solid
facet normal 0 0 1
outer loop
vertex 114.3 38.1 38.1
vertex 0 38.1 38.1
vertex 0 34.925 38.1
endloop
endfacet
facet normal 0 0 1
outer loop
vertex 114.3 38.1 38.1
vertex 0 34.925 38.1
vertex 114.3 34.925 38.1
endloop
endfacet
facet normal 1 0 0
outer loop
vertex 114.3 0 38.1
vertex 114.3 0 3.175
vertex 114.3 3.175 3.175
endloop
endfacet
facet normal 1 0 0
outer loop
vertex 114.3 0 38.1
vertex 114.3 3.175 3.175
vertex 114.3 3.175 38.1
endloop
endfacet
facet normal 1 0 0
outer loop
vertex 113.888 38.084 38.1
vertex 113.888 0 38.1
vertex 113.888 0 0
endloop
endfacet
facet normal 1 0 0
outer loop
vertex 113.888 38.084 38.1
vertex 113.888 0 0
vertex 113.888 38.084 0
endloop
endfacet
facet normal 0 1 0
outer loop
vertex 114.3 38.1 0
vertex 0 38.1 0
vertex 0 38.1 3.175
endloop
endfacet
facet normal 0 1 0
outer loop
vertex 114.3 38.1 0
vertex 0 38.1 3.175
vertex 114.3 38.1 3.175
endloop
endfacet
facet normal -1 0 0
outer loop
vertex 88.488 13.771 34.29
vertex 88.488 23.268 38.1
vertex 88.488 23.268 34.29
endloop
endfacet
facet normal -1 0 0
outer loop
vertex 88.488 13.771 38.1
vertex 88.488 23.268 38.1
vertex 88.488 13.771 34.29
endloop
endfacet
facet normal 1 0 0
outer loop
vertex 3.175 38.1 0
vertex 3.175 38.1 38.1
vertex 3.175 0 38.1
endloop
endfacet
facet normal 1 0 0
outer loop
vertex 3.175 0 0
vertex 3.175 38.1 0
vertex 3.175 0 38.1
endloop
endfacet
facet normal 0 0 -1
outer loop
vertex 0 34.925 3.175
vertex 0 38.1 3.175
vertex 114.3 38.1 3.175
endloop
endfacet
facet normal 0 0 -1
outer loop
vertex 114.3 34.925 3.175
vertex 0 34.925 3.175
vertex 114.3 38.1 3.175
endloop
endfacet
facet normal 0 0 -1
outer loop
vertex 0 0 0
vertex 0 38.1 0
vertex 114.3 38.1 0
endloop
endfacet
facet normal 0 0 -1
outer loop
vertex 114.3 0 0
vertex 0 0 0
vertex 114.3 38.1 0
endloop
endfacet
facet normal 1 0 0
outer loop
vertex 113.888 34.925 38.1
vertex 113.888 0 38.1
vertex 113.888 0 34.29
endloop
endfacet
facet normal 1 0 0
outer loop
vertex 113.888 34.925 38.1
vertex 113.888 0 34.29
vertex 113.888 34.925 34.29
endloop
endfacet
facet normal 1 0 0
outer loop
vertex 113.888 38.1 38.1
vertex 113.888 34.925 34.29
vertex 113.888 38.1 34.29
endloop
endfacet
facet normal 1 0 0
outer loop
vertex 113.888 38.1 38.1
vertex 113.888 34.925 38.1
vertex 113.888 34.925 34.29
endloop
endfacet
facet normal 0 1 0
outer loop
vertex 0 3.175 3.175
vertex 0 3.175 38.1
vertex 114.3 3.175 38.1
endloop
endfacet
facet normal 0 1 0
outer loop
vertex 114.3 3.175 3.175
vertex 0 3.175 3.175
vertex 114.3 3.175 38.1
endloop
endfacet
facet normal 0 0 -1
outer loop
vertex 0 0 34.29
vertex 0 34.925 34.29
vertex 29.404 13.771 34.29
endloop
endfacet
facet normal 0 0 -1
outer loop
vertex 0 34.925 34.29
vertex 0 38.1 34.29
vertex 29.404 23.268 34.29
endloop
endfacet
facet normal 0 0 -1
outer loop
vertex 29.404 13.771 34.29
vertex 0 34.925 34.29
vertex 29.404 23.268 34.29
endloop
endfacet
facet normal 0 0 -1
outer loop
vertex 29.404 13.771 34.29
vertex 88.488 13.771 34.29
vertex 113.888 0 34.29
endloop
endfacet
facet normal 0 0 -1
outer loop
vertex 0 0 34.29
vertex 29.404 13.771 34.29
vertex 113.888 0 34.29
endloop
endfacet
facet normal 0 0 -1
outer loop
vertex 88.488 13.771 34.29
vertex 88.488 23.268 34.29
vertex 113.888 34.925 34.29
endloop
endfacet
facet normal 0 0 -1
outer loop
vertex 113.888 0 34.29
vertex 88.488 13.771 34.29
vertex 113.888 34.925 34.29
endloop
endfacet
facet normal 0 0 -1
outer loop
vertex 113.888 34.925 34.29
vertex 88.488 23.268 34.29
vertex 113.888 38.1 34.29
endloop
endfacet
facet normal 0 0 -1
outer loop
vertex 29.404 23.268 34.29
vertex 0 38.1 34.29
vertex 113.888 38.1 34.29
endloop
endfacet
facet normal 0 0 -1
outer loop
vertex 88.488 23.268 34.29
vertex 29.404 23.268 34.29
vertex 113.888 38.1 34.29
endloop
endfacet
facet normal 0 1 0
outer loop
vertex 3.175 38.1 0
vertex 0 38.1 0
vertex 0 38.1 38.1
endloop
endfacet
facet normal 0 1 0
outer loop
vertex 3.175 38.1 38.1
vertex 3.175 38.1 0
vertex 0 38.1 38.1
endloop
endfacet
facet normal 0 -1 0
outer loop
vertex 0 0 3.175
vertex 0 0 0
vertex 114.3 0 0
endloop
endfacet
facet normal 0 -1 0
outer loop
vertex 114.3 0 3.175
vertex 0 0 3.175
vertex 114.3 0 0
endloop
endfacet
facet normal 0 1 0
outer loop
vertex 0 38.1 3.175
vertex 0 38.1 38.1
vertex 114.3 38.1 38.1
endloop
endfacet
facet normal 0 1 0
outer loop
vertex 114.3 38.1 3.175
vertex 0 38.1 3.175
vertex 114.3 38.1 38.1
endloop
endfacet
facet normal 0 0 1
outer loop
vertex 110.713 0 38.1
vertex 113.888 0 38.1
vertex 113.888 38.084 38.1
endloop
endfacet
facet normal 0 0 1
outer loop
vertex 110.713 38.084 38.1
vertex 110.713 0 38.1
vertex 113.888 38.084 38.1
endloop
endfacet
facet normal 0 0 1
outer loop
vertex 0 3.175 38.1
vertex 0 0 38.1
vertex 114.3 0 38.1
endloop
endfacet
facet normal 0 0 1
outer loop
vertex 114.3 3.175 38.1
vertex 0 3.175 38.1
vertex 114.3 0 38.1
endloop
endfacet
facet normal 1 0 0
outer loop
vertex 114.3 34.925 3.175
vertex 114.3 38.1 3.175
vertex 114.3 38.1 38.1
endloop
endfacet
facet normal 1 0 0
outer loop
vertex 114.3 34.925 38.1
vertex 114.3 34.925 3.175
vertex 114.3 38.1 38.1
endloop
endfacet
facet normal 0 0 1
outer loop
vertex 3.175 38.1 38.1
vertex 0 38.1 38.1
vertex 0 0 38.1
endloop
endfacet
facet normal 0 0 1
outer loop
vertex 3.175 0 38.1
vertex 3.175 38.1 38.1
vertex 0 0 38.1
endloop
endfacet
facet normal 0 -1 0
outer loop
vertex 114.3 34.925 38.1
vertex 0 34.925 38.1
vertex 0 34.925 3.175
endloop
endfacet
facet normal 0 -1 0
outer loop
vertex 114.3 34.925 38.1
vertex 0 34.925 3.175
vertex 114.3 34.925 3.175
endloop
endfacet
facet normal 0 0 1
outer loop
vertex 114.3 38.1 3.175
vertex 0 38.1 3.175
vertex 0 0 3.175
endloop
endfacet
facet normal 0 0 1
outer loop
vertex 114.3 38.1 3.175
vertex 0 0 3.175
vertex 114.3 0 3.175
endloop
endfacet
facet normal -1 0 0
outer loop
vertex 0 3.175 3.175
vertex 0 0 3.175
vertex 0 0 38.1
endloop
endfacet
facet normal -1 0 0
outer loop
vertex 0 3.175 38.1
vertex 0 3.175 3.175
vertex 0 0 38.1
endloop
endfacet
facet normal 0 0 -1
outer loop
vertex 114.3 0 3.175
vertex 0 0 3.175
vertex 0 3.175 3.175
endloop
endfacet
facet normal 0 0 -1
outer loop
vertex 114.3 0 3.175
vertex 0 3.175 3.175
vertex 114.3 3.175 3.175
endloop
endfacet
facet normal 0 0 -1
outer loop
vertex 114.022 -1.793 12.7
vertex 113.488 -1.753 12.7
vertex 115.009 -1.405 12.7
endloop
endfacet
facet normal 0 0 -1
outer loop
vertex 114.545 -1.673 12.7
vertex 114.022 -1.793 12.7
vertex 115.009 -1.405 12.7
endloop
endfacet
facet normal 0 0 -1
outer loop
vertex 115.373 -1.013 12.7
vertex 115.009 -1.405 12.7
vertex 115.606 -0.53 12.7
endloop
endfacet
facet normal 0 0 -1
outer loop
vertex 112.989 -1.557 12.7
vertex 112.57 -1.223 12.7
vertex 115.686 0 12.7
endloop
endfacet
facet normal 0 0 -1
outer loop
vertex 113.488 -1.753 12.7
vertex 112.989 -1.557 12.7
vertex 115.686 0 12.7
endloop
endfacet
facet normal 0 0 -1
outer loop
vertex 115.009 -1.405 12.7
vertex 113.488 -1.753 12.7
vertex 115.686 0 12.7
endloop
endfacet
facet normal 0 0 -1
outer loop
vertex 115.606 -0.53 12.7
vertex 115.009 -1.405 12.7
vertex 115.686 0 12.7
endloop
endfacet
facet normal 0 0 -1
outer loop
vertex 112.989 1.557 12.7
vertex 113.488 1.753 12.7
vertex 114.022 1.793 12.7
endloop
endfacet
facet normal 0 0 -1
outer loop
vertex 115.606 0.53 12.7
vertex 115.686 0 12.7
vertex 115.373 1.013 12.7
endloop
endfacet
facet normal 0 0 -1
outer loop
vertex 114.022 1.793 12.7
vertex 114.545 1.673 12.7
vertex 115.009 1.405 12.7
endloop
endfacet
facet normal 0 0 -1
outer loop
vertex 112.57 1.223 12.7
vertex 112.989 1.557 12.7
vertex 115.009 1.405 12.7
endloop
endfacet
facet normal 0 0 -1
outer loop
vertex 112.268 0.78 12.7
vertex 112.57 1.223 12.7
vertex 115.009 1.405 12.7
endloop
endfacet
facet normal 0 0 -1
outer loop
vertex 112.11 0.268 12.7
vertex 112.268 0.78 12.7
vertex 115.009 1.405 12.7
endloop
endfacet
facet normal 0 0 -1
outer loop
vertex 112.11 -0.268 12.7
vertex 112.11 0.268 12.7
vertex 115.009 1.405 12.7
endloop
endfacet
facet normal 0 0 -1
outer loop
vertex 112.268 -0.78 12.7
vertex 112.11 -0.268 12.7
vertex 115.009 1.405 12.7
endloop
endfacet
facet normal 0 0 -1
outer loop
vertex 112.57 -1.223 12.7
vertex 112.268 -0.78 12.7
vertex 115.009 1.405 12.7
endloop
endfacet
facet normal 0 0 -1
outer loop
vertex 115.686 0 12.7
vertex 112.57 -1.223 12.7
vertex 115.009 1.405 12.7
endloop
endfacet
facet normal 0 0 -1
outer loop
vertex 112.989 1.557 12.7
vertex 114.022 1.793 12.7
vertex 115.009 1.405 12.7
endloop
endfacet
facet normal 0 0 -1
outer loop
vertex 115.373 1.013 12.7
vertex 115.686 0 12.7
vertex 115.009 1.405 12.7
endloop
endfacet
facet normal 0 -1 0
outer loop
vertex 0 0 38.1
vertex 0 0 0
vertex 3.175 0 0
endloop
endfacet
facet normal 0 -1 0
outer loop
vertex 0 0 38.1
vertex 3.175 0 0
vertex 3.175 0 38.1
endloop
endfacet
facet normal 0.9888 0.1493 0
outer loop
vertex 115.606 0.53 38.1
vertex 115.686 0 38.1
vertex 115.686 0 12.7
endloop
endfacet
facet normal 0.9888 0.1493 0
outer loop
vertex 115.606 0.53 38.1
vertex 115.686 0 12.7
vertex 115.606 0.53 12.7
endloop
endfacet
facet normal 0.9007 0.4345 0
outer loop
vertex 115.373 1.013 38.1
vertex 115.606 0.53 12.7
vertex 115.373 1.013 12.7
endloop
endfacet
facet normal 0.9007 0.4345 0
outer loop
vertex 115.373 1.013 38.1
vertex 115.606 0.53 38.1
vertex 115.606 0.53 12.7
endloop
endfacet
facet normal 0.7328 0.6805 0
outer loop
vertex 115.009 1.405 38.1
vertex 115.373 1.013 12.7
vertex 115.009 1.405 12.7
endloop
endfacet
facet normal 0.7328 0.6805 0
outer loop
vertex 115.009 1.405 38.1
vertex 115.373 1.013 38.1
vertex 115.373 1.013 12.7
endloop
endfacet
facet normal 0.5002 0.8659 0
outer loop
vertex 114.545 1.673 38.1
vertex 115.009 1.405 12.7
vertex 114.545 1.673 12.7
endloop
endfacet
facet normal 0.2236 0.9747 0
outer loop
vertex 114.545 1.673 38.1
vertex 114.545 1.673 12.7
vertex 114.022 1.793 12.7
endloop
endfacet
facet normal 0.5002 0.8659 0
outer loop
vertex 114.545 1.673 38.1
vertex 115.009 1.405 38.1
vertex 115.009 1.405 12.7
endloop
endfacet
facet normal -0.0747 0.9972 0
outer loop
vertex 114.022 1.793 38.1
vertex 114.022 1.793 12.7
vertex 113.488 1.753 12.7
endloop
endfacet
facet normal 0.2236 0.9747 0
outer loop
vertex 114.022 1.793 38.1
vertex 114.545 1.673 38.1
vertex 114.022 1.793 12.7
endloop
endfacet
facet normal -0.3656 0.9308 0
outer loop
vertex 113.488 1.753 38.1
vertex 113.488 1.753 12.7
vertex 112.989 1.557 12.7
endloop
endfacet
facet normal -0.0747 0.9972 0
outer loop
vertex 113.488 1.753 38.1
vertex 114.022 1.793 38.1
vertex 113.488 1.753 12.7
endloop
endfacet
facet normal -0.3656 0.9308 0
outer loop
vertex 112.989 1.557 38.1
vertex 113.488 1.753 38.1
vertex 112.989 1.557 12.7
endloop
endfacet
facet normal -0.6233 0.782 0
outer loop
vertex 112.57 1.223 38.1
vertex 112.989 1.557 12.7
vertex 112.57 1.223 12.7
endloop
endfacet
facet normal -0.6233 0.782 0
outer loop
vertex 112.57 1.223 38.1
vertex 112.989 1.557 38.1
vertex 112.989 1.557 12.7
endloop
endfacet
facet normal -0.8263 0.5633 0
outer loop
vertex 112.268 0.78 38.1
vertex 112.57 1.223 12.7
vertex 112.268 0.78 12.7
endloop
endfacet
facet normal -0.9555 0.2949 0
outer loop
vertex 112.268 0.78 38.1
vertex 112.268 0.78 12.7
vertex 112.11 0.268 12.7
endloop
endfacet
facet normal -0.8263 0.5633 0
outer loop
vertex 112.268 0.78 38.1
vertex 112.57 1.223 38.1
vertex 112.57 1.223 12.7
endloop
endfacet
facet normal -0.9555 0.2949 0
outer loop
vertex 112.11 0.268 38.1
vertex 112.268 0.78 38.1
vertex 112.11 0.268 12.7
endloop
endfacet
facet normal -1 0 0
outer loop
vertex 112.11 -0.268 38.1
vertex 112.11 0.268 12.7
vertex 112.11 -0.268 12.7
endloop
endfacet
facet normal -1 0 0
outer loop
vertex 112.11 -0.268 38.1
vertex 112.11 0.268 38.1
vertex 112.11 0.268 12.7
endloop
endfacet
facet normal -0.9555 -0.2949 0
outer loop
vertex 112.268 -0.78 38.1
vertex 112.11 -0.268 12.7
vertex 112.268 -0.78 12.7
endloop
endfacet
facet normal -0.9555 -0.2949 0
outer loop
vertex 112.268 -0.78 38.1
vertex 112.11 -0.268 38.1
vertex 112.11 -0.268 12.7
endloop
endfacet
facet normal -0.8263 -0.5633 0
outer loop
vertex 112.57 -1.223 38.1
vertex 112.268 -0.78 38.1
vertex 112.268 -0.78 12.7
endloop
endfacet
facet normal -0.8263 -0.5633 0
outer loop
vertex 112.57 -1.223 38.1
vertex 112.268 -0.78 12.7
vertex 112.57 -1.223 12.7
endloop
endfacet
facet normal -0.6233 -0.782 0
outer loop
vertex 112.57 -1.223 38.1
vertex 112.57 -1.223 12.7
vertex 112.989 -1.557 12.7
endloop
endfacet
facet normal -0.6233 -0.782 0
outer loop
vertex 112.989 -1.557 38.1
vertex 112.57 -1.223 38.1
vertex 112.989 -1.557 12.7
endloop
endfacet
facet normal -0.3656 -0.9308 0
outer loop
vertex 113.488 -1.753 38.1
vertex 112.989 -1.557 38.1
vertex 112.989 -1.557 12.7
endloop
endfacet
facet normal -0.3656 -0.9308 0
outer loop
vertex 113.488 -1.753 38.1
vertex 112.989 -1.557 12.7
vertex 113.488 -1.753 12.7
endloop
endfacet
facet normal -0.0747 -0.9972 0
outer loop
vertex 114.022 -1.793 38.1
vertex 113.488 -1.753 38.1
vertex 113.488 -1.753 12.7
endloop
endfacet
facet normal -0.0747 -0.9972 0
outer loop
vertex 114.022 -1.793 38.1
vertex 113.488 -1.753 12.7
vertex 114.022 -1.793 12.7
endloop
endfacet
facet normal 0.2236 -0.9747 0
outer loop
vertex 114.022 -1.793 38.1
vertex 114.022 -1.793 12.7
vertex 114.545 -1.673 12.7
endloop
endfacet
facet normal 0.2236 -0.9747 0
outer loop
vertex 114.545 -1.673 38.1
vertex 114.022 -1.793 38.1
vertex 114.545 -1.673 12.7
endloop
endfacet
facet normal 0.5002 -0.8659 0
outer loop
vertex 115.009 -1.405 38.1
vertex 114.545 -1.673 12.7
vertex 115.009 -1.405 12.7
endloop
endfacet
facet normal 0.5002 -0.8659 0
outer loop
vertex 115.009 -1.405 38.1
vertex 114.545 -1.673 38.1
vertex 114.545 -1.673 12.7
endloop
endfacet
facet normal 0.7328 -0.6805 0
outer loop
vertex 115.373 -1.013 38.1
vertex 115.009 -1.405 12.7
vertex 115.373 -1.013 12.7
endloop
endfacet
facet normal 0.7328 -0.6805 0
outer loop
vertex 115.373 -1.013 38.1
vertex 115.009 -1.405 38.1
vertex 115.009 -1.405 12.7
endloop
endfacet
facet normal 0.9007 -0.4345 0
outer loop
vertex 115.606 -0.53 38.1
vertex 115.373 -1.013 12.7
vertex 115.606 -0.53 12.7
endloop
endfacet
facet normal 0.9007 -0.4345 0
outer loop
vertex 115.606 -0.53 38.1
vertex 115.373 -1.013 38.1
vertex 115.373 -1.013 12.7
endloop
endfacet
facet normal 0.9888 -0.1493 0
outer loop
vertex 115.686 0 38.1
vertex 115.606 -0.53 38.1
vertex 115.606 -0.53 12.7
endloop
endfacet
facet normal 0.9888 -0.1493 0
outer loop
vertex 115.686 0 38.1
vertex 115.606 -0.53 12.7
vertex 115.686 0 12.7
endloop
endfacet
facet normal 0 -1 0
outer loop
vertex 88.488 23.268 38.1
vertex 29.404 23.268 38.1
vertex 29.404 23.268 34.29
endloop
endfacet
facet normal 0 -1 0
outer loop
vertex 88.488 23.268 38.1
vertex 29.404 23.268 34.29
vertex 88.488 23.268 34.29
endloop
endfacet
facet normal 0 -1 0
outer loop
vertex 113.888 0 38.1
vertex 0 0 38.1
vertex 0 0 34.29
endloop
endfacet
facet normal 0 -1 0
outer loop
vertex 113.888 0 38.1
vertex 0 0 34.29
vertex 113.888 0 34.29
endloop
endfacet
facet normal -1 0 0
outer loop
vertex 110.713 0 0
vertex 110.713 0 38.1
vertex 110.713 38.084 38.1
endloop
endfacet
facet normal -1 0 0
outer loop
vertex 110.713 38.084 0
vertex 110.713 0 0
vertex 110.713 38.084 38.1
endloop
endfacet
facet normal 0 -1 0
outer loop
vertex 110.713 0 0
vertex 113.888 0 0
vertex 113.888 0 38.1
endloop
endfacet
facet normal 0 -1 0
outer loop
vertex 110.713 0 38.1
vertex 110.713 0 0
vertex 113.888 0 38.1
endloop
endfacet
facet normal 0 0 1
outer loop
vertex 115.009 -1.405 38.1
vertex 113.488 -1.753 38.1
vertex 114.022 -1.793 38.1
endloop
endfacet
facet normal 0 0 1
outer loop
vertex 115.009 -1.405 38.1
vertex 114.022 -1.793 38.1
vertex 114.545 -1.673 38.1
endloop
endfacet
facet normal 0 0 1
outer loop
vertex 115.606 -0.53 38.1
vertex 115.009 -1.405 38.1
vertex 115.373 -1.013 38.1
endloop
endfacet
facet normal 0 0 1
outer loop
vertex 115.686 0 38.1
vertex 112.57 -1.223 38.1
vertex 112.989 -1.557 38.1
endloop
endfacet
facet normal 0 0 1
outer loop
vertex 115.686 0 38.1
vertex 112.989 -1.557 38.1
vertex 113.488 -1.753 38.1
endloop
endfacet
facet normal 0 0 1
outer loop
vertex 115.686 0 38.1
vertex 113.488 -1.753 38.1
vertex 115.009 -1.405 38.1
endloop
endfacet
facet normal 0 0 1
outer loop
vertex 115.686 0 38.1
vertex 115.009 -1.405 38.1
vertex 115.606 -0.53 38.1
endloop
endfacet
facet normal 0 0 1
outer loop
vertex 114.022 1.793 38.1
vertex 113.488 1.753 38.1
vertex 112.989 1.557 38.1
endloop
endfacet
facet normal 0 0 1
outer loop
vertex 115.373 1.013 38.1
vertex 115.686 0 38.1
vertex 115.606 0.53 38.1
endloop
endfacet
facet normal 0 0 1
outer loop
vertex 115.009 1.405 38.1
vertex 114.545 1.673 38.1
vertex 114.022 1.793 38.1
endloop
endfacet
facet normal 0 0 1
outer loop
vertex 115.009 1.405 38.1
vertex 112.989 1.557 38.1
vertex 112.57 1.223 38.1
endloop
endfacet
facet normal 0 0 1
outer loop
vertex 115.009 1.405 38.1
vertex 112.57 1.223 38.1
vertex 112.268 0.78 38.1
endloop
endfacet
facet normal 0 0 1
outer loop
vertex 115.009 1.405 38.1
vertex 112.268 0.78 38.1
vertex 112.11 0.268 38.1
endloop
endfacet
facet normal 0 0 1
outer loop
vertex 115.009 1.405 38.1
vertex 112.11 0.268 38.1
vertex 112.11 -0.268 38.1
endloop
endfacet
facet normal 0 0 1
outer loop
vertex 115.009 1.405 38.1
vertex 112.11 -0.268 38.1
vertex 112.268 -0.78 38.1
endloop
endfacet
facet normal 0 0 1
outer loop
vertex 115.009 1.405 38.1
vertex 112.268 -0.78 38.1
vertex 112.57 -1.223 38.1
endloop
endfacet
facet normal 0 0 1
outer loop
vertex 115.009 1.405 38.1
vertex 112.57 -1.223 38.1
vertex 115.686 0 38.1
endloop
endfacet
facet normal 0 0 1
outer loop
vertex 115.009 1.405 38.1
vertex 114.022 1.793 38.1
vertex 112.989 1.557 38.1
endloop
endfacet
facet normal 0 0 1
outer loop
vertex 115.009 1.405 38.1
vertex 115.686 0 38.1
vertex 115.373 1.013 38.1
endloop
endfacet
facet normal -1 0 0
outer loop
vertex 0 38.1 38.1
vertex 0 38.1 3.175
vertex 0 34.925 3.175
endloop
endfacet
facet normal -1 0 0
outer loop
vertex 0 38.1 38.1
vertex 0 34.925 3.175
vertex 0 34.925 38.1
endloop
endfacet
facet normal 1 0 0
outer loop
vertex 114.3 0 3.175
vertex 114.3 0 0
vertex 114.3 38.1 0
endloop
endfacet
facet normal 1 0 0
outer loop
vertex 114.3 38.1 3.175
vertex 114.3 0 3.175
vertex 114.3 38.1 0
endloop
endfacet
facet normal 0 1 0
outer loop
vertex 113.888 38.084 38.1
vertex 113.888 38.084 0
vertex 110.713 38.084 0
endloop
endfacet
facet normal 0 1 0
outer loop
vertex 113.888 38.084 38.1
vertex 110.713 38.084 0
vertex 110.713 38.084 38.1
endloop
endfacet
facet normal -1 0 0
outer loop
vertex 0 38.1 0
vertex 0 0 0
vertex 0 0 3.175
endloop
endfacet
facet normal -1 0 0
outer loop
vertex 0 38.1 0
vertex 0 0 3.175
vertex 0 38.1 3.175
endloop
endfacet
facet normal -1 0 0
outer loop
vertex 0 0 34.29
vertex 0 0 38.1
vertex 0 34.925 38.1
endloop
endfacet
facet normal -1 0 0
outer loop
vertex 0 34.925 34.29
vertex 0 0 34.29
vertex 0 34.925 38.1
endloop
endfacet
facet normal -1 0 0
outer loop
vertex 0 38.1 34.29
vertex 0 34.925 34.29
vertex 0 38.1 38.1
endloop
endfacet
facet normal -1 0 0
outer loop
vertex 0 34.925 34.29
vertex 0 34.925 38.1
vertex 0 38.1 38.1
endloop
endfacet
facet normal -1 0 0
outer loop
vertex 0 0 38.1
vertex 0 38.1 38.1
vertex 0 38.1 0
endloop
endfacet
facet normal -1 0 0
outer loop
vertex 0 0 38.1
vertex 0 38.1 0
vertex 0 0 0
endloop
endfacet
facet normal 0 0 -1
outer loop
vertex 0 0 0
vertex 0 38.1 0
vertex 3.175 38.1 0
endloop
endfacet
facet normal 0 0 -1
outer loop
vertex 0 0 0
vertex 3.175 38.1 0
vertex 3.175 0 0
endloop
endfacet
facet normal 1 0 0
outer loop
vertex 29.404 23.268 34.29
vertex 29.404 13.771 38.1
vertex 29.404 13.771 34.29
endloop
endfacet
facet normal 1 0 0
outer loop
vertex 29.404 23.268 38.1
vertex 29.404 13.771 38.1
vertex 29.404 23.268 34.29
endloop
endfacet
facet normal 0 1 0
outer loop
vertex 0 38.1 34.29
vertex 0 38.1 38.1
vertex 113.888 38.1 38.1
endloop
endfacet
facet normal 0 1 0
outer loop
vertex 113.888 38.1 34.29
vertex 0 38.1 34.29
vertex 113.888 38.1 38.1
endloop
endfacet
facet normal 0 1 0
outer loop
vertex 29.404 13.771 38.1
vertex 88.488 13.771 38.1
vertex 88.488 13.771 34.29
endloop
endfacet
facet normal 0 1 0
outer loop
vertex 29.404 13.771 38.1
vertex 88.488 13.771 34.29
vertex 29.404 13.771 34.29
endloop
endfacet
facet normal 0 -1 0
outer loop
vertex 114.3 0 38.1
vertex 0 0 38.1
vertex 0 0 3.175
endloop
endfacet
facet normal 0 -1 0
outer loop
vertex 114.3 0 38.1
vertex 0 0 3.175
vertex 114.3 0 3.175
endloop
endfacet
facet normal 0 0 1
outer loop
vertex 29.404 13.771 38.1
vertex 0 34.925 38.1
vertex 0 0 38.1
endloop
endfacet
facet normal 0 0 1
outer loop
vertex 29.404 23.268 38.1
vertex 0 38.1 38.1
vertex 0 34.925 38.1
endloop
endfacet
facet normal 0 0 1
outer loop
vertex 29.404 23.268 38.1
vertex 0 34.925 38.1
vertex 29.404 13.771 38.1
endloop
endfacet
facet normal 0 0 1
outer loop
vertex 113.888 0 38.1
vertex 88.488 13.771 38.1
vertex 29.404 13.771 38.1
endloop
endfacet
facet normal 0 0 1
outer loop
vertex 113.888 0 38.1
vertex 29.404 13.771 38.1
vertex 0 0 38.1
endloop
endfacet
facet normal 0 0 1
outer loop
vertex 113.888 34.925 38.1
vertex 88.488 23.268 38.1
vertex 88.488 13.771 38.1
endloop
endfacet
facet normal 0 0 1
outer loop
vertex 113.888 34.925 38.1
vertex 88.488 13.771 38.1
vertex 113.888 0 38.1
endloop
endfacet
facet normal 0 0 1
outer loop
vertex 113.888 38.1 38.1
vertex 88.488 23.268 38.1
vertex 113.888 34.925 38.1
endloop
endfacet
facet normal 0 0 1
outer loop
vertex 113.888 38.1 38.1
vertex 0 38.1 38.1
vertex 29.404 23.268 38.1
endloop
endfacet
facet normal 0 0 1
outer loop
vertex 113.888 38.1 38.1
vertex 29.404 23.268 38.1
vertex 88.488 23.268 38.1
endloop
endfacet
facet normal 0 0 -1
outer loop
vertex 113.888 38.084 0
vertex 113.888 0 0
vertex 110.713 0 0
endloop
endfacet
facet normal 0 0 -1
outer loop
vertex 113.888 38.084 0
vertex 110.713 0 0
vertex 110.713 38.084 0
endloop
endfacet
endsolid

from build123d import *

# Parameters (mm, degrees)
F0_W      = 114.3
F0_H      = 38.1
F1_DEPTH  = 3.175
F2_W      = 114.3
F2_H      = 34.925
F3_DEPTH  = 3.175
F8_W      = 113.8879880309
F8_H      = 3.175
F9_DEPTH  = 3.81
F10_W     = 38.1
F10_H     = 38.1
F11_DEPTH = 3.175
F12_W     = 38.0842164159
F12_H     = 38.1
F13_DEPTH = 3.175
F8_W_2    = 59.0841079511
F8_H_2    = 4.218410936
F8_H_3    = 5.2788990989
F14_DEPTH = 3.175
F15_R     = 1.7975926973
F16_DEPTH = 25.4


# Not quite as in the source:
# - a length typed as a fraction of an inch, garbled in the dataset ("3 / 203.2 mm" for 3/8 in), is restored


with BuildPart() as f1:
    # F0 (on Top) → F1 (new body)
    with BuildSketch(Plane.XY):
        with Locations((57.15, 19.05)):
            Rectangle(F0_W, F0_H)
    extrude(amount=F1_DEPTH)

    # F8 (on face) → F14 (cut)
    with BuildSketch(Plane.XY.offset(38.1)):
        with Locations((58.9459340554, 21.159205468)):
            Rectangle(F8_W_2, F8_H_2)
        with Locations((58.9459340554, 16.4105504505)):
            Rectangle(F8_W_2, F8_H_3)
    extrude(amount=-F14_DEPTH, mode=Mode.SUBTRACT)


with BuildPart() as f3:
    # F2 (on face) → F3 (new body)
    with BuildSketch(Plane.XZ):
        with Locations((57.15, 20.6375)):
            Rectangle(F2_W, F2_H)
    extrude(amount=-F3_DEPTH)


with BuildPart() as f7_1:
    # F7: instance of F3
    add(f3.part.mirror(Plane(origin=(57.15, 19.05, 3.175), x_dir=(1, 0, 0), z_dir=(0, -1, 0))))


with BuildPart() as f9:
    # F8 (on face) → F9 (new body)
    with BuildSketch(Plane.XY.offset(38.1)):
        Polygon((4.0038800798, 19.05), (0, 19.05), (0, 0), (113.8879880309, 0), (113.8879880309, 19.05), (88.4879880309, 19.05), (88.4879880309, 13.7711009011), (29.4038800798, 13.7711009011), (29.4038800798, 19.05), align=None)
        with Locations((56.9439940155, 36.5125)):
            Rectangle(F8_W, F8_H)
        Polygon((113.8879880309, 34.925), (0, 34.925), (0, 19.05), (4.0038800798, 19.05), (29.4038800798, 19.05), (29.4038800798, 23.268410936), (88.4879880309, 23.268410936), (88.4879880309, 19.05), (113.8879880309, 19.05), align=None)
    extrude(amount=-F9_DEPTH)


with BuildPart() as f11:
    # F10 (on face) → F11 (new body)
    with BuildSketch(Plane(origin=(0, 0, 0), x_dir=(0, -1, 0), z_dir=(-1, 0, 0))):
        with Locations((-19.05, 19.05)):
            Rectangle(F10_W, F10_H)
    extrude(amount=-F11_DEPTH)


with BuildPart() as f13:
    # F12 (on face) → F13 (new body)
    with BuildSketch(Plane.YZ.offset(113.8879880309)):
        with Locations((19.0421082079, 19.05)):
            Rectangle(F12_W, F12_H)
    extrude(amount=-F13_DEPTH)


with BuildPart() as f16:
    # F15 (on face) → F16 (new body)
    with BuildSketch(Plane.XY.offset(38.1)):
        with Locations((113.8879880309, 0)):
            Circle(F15_R)
    extrude(amount=-F16_DEPTH)


solid = Compound([f1.part, f3.part, f7_1.part, f9.part, f11.part, f13.part, f16.part])
